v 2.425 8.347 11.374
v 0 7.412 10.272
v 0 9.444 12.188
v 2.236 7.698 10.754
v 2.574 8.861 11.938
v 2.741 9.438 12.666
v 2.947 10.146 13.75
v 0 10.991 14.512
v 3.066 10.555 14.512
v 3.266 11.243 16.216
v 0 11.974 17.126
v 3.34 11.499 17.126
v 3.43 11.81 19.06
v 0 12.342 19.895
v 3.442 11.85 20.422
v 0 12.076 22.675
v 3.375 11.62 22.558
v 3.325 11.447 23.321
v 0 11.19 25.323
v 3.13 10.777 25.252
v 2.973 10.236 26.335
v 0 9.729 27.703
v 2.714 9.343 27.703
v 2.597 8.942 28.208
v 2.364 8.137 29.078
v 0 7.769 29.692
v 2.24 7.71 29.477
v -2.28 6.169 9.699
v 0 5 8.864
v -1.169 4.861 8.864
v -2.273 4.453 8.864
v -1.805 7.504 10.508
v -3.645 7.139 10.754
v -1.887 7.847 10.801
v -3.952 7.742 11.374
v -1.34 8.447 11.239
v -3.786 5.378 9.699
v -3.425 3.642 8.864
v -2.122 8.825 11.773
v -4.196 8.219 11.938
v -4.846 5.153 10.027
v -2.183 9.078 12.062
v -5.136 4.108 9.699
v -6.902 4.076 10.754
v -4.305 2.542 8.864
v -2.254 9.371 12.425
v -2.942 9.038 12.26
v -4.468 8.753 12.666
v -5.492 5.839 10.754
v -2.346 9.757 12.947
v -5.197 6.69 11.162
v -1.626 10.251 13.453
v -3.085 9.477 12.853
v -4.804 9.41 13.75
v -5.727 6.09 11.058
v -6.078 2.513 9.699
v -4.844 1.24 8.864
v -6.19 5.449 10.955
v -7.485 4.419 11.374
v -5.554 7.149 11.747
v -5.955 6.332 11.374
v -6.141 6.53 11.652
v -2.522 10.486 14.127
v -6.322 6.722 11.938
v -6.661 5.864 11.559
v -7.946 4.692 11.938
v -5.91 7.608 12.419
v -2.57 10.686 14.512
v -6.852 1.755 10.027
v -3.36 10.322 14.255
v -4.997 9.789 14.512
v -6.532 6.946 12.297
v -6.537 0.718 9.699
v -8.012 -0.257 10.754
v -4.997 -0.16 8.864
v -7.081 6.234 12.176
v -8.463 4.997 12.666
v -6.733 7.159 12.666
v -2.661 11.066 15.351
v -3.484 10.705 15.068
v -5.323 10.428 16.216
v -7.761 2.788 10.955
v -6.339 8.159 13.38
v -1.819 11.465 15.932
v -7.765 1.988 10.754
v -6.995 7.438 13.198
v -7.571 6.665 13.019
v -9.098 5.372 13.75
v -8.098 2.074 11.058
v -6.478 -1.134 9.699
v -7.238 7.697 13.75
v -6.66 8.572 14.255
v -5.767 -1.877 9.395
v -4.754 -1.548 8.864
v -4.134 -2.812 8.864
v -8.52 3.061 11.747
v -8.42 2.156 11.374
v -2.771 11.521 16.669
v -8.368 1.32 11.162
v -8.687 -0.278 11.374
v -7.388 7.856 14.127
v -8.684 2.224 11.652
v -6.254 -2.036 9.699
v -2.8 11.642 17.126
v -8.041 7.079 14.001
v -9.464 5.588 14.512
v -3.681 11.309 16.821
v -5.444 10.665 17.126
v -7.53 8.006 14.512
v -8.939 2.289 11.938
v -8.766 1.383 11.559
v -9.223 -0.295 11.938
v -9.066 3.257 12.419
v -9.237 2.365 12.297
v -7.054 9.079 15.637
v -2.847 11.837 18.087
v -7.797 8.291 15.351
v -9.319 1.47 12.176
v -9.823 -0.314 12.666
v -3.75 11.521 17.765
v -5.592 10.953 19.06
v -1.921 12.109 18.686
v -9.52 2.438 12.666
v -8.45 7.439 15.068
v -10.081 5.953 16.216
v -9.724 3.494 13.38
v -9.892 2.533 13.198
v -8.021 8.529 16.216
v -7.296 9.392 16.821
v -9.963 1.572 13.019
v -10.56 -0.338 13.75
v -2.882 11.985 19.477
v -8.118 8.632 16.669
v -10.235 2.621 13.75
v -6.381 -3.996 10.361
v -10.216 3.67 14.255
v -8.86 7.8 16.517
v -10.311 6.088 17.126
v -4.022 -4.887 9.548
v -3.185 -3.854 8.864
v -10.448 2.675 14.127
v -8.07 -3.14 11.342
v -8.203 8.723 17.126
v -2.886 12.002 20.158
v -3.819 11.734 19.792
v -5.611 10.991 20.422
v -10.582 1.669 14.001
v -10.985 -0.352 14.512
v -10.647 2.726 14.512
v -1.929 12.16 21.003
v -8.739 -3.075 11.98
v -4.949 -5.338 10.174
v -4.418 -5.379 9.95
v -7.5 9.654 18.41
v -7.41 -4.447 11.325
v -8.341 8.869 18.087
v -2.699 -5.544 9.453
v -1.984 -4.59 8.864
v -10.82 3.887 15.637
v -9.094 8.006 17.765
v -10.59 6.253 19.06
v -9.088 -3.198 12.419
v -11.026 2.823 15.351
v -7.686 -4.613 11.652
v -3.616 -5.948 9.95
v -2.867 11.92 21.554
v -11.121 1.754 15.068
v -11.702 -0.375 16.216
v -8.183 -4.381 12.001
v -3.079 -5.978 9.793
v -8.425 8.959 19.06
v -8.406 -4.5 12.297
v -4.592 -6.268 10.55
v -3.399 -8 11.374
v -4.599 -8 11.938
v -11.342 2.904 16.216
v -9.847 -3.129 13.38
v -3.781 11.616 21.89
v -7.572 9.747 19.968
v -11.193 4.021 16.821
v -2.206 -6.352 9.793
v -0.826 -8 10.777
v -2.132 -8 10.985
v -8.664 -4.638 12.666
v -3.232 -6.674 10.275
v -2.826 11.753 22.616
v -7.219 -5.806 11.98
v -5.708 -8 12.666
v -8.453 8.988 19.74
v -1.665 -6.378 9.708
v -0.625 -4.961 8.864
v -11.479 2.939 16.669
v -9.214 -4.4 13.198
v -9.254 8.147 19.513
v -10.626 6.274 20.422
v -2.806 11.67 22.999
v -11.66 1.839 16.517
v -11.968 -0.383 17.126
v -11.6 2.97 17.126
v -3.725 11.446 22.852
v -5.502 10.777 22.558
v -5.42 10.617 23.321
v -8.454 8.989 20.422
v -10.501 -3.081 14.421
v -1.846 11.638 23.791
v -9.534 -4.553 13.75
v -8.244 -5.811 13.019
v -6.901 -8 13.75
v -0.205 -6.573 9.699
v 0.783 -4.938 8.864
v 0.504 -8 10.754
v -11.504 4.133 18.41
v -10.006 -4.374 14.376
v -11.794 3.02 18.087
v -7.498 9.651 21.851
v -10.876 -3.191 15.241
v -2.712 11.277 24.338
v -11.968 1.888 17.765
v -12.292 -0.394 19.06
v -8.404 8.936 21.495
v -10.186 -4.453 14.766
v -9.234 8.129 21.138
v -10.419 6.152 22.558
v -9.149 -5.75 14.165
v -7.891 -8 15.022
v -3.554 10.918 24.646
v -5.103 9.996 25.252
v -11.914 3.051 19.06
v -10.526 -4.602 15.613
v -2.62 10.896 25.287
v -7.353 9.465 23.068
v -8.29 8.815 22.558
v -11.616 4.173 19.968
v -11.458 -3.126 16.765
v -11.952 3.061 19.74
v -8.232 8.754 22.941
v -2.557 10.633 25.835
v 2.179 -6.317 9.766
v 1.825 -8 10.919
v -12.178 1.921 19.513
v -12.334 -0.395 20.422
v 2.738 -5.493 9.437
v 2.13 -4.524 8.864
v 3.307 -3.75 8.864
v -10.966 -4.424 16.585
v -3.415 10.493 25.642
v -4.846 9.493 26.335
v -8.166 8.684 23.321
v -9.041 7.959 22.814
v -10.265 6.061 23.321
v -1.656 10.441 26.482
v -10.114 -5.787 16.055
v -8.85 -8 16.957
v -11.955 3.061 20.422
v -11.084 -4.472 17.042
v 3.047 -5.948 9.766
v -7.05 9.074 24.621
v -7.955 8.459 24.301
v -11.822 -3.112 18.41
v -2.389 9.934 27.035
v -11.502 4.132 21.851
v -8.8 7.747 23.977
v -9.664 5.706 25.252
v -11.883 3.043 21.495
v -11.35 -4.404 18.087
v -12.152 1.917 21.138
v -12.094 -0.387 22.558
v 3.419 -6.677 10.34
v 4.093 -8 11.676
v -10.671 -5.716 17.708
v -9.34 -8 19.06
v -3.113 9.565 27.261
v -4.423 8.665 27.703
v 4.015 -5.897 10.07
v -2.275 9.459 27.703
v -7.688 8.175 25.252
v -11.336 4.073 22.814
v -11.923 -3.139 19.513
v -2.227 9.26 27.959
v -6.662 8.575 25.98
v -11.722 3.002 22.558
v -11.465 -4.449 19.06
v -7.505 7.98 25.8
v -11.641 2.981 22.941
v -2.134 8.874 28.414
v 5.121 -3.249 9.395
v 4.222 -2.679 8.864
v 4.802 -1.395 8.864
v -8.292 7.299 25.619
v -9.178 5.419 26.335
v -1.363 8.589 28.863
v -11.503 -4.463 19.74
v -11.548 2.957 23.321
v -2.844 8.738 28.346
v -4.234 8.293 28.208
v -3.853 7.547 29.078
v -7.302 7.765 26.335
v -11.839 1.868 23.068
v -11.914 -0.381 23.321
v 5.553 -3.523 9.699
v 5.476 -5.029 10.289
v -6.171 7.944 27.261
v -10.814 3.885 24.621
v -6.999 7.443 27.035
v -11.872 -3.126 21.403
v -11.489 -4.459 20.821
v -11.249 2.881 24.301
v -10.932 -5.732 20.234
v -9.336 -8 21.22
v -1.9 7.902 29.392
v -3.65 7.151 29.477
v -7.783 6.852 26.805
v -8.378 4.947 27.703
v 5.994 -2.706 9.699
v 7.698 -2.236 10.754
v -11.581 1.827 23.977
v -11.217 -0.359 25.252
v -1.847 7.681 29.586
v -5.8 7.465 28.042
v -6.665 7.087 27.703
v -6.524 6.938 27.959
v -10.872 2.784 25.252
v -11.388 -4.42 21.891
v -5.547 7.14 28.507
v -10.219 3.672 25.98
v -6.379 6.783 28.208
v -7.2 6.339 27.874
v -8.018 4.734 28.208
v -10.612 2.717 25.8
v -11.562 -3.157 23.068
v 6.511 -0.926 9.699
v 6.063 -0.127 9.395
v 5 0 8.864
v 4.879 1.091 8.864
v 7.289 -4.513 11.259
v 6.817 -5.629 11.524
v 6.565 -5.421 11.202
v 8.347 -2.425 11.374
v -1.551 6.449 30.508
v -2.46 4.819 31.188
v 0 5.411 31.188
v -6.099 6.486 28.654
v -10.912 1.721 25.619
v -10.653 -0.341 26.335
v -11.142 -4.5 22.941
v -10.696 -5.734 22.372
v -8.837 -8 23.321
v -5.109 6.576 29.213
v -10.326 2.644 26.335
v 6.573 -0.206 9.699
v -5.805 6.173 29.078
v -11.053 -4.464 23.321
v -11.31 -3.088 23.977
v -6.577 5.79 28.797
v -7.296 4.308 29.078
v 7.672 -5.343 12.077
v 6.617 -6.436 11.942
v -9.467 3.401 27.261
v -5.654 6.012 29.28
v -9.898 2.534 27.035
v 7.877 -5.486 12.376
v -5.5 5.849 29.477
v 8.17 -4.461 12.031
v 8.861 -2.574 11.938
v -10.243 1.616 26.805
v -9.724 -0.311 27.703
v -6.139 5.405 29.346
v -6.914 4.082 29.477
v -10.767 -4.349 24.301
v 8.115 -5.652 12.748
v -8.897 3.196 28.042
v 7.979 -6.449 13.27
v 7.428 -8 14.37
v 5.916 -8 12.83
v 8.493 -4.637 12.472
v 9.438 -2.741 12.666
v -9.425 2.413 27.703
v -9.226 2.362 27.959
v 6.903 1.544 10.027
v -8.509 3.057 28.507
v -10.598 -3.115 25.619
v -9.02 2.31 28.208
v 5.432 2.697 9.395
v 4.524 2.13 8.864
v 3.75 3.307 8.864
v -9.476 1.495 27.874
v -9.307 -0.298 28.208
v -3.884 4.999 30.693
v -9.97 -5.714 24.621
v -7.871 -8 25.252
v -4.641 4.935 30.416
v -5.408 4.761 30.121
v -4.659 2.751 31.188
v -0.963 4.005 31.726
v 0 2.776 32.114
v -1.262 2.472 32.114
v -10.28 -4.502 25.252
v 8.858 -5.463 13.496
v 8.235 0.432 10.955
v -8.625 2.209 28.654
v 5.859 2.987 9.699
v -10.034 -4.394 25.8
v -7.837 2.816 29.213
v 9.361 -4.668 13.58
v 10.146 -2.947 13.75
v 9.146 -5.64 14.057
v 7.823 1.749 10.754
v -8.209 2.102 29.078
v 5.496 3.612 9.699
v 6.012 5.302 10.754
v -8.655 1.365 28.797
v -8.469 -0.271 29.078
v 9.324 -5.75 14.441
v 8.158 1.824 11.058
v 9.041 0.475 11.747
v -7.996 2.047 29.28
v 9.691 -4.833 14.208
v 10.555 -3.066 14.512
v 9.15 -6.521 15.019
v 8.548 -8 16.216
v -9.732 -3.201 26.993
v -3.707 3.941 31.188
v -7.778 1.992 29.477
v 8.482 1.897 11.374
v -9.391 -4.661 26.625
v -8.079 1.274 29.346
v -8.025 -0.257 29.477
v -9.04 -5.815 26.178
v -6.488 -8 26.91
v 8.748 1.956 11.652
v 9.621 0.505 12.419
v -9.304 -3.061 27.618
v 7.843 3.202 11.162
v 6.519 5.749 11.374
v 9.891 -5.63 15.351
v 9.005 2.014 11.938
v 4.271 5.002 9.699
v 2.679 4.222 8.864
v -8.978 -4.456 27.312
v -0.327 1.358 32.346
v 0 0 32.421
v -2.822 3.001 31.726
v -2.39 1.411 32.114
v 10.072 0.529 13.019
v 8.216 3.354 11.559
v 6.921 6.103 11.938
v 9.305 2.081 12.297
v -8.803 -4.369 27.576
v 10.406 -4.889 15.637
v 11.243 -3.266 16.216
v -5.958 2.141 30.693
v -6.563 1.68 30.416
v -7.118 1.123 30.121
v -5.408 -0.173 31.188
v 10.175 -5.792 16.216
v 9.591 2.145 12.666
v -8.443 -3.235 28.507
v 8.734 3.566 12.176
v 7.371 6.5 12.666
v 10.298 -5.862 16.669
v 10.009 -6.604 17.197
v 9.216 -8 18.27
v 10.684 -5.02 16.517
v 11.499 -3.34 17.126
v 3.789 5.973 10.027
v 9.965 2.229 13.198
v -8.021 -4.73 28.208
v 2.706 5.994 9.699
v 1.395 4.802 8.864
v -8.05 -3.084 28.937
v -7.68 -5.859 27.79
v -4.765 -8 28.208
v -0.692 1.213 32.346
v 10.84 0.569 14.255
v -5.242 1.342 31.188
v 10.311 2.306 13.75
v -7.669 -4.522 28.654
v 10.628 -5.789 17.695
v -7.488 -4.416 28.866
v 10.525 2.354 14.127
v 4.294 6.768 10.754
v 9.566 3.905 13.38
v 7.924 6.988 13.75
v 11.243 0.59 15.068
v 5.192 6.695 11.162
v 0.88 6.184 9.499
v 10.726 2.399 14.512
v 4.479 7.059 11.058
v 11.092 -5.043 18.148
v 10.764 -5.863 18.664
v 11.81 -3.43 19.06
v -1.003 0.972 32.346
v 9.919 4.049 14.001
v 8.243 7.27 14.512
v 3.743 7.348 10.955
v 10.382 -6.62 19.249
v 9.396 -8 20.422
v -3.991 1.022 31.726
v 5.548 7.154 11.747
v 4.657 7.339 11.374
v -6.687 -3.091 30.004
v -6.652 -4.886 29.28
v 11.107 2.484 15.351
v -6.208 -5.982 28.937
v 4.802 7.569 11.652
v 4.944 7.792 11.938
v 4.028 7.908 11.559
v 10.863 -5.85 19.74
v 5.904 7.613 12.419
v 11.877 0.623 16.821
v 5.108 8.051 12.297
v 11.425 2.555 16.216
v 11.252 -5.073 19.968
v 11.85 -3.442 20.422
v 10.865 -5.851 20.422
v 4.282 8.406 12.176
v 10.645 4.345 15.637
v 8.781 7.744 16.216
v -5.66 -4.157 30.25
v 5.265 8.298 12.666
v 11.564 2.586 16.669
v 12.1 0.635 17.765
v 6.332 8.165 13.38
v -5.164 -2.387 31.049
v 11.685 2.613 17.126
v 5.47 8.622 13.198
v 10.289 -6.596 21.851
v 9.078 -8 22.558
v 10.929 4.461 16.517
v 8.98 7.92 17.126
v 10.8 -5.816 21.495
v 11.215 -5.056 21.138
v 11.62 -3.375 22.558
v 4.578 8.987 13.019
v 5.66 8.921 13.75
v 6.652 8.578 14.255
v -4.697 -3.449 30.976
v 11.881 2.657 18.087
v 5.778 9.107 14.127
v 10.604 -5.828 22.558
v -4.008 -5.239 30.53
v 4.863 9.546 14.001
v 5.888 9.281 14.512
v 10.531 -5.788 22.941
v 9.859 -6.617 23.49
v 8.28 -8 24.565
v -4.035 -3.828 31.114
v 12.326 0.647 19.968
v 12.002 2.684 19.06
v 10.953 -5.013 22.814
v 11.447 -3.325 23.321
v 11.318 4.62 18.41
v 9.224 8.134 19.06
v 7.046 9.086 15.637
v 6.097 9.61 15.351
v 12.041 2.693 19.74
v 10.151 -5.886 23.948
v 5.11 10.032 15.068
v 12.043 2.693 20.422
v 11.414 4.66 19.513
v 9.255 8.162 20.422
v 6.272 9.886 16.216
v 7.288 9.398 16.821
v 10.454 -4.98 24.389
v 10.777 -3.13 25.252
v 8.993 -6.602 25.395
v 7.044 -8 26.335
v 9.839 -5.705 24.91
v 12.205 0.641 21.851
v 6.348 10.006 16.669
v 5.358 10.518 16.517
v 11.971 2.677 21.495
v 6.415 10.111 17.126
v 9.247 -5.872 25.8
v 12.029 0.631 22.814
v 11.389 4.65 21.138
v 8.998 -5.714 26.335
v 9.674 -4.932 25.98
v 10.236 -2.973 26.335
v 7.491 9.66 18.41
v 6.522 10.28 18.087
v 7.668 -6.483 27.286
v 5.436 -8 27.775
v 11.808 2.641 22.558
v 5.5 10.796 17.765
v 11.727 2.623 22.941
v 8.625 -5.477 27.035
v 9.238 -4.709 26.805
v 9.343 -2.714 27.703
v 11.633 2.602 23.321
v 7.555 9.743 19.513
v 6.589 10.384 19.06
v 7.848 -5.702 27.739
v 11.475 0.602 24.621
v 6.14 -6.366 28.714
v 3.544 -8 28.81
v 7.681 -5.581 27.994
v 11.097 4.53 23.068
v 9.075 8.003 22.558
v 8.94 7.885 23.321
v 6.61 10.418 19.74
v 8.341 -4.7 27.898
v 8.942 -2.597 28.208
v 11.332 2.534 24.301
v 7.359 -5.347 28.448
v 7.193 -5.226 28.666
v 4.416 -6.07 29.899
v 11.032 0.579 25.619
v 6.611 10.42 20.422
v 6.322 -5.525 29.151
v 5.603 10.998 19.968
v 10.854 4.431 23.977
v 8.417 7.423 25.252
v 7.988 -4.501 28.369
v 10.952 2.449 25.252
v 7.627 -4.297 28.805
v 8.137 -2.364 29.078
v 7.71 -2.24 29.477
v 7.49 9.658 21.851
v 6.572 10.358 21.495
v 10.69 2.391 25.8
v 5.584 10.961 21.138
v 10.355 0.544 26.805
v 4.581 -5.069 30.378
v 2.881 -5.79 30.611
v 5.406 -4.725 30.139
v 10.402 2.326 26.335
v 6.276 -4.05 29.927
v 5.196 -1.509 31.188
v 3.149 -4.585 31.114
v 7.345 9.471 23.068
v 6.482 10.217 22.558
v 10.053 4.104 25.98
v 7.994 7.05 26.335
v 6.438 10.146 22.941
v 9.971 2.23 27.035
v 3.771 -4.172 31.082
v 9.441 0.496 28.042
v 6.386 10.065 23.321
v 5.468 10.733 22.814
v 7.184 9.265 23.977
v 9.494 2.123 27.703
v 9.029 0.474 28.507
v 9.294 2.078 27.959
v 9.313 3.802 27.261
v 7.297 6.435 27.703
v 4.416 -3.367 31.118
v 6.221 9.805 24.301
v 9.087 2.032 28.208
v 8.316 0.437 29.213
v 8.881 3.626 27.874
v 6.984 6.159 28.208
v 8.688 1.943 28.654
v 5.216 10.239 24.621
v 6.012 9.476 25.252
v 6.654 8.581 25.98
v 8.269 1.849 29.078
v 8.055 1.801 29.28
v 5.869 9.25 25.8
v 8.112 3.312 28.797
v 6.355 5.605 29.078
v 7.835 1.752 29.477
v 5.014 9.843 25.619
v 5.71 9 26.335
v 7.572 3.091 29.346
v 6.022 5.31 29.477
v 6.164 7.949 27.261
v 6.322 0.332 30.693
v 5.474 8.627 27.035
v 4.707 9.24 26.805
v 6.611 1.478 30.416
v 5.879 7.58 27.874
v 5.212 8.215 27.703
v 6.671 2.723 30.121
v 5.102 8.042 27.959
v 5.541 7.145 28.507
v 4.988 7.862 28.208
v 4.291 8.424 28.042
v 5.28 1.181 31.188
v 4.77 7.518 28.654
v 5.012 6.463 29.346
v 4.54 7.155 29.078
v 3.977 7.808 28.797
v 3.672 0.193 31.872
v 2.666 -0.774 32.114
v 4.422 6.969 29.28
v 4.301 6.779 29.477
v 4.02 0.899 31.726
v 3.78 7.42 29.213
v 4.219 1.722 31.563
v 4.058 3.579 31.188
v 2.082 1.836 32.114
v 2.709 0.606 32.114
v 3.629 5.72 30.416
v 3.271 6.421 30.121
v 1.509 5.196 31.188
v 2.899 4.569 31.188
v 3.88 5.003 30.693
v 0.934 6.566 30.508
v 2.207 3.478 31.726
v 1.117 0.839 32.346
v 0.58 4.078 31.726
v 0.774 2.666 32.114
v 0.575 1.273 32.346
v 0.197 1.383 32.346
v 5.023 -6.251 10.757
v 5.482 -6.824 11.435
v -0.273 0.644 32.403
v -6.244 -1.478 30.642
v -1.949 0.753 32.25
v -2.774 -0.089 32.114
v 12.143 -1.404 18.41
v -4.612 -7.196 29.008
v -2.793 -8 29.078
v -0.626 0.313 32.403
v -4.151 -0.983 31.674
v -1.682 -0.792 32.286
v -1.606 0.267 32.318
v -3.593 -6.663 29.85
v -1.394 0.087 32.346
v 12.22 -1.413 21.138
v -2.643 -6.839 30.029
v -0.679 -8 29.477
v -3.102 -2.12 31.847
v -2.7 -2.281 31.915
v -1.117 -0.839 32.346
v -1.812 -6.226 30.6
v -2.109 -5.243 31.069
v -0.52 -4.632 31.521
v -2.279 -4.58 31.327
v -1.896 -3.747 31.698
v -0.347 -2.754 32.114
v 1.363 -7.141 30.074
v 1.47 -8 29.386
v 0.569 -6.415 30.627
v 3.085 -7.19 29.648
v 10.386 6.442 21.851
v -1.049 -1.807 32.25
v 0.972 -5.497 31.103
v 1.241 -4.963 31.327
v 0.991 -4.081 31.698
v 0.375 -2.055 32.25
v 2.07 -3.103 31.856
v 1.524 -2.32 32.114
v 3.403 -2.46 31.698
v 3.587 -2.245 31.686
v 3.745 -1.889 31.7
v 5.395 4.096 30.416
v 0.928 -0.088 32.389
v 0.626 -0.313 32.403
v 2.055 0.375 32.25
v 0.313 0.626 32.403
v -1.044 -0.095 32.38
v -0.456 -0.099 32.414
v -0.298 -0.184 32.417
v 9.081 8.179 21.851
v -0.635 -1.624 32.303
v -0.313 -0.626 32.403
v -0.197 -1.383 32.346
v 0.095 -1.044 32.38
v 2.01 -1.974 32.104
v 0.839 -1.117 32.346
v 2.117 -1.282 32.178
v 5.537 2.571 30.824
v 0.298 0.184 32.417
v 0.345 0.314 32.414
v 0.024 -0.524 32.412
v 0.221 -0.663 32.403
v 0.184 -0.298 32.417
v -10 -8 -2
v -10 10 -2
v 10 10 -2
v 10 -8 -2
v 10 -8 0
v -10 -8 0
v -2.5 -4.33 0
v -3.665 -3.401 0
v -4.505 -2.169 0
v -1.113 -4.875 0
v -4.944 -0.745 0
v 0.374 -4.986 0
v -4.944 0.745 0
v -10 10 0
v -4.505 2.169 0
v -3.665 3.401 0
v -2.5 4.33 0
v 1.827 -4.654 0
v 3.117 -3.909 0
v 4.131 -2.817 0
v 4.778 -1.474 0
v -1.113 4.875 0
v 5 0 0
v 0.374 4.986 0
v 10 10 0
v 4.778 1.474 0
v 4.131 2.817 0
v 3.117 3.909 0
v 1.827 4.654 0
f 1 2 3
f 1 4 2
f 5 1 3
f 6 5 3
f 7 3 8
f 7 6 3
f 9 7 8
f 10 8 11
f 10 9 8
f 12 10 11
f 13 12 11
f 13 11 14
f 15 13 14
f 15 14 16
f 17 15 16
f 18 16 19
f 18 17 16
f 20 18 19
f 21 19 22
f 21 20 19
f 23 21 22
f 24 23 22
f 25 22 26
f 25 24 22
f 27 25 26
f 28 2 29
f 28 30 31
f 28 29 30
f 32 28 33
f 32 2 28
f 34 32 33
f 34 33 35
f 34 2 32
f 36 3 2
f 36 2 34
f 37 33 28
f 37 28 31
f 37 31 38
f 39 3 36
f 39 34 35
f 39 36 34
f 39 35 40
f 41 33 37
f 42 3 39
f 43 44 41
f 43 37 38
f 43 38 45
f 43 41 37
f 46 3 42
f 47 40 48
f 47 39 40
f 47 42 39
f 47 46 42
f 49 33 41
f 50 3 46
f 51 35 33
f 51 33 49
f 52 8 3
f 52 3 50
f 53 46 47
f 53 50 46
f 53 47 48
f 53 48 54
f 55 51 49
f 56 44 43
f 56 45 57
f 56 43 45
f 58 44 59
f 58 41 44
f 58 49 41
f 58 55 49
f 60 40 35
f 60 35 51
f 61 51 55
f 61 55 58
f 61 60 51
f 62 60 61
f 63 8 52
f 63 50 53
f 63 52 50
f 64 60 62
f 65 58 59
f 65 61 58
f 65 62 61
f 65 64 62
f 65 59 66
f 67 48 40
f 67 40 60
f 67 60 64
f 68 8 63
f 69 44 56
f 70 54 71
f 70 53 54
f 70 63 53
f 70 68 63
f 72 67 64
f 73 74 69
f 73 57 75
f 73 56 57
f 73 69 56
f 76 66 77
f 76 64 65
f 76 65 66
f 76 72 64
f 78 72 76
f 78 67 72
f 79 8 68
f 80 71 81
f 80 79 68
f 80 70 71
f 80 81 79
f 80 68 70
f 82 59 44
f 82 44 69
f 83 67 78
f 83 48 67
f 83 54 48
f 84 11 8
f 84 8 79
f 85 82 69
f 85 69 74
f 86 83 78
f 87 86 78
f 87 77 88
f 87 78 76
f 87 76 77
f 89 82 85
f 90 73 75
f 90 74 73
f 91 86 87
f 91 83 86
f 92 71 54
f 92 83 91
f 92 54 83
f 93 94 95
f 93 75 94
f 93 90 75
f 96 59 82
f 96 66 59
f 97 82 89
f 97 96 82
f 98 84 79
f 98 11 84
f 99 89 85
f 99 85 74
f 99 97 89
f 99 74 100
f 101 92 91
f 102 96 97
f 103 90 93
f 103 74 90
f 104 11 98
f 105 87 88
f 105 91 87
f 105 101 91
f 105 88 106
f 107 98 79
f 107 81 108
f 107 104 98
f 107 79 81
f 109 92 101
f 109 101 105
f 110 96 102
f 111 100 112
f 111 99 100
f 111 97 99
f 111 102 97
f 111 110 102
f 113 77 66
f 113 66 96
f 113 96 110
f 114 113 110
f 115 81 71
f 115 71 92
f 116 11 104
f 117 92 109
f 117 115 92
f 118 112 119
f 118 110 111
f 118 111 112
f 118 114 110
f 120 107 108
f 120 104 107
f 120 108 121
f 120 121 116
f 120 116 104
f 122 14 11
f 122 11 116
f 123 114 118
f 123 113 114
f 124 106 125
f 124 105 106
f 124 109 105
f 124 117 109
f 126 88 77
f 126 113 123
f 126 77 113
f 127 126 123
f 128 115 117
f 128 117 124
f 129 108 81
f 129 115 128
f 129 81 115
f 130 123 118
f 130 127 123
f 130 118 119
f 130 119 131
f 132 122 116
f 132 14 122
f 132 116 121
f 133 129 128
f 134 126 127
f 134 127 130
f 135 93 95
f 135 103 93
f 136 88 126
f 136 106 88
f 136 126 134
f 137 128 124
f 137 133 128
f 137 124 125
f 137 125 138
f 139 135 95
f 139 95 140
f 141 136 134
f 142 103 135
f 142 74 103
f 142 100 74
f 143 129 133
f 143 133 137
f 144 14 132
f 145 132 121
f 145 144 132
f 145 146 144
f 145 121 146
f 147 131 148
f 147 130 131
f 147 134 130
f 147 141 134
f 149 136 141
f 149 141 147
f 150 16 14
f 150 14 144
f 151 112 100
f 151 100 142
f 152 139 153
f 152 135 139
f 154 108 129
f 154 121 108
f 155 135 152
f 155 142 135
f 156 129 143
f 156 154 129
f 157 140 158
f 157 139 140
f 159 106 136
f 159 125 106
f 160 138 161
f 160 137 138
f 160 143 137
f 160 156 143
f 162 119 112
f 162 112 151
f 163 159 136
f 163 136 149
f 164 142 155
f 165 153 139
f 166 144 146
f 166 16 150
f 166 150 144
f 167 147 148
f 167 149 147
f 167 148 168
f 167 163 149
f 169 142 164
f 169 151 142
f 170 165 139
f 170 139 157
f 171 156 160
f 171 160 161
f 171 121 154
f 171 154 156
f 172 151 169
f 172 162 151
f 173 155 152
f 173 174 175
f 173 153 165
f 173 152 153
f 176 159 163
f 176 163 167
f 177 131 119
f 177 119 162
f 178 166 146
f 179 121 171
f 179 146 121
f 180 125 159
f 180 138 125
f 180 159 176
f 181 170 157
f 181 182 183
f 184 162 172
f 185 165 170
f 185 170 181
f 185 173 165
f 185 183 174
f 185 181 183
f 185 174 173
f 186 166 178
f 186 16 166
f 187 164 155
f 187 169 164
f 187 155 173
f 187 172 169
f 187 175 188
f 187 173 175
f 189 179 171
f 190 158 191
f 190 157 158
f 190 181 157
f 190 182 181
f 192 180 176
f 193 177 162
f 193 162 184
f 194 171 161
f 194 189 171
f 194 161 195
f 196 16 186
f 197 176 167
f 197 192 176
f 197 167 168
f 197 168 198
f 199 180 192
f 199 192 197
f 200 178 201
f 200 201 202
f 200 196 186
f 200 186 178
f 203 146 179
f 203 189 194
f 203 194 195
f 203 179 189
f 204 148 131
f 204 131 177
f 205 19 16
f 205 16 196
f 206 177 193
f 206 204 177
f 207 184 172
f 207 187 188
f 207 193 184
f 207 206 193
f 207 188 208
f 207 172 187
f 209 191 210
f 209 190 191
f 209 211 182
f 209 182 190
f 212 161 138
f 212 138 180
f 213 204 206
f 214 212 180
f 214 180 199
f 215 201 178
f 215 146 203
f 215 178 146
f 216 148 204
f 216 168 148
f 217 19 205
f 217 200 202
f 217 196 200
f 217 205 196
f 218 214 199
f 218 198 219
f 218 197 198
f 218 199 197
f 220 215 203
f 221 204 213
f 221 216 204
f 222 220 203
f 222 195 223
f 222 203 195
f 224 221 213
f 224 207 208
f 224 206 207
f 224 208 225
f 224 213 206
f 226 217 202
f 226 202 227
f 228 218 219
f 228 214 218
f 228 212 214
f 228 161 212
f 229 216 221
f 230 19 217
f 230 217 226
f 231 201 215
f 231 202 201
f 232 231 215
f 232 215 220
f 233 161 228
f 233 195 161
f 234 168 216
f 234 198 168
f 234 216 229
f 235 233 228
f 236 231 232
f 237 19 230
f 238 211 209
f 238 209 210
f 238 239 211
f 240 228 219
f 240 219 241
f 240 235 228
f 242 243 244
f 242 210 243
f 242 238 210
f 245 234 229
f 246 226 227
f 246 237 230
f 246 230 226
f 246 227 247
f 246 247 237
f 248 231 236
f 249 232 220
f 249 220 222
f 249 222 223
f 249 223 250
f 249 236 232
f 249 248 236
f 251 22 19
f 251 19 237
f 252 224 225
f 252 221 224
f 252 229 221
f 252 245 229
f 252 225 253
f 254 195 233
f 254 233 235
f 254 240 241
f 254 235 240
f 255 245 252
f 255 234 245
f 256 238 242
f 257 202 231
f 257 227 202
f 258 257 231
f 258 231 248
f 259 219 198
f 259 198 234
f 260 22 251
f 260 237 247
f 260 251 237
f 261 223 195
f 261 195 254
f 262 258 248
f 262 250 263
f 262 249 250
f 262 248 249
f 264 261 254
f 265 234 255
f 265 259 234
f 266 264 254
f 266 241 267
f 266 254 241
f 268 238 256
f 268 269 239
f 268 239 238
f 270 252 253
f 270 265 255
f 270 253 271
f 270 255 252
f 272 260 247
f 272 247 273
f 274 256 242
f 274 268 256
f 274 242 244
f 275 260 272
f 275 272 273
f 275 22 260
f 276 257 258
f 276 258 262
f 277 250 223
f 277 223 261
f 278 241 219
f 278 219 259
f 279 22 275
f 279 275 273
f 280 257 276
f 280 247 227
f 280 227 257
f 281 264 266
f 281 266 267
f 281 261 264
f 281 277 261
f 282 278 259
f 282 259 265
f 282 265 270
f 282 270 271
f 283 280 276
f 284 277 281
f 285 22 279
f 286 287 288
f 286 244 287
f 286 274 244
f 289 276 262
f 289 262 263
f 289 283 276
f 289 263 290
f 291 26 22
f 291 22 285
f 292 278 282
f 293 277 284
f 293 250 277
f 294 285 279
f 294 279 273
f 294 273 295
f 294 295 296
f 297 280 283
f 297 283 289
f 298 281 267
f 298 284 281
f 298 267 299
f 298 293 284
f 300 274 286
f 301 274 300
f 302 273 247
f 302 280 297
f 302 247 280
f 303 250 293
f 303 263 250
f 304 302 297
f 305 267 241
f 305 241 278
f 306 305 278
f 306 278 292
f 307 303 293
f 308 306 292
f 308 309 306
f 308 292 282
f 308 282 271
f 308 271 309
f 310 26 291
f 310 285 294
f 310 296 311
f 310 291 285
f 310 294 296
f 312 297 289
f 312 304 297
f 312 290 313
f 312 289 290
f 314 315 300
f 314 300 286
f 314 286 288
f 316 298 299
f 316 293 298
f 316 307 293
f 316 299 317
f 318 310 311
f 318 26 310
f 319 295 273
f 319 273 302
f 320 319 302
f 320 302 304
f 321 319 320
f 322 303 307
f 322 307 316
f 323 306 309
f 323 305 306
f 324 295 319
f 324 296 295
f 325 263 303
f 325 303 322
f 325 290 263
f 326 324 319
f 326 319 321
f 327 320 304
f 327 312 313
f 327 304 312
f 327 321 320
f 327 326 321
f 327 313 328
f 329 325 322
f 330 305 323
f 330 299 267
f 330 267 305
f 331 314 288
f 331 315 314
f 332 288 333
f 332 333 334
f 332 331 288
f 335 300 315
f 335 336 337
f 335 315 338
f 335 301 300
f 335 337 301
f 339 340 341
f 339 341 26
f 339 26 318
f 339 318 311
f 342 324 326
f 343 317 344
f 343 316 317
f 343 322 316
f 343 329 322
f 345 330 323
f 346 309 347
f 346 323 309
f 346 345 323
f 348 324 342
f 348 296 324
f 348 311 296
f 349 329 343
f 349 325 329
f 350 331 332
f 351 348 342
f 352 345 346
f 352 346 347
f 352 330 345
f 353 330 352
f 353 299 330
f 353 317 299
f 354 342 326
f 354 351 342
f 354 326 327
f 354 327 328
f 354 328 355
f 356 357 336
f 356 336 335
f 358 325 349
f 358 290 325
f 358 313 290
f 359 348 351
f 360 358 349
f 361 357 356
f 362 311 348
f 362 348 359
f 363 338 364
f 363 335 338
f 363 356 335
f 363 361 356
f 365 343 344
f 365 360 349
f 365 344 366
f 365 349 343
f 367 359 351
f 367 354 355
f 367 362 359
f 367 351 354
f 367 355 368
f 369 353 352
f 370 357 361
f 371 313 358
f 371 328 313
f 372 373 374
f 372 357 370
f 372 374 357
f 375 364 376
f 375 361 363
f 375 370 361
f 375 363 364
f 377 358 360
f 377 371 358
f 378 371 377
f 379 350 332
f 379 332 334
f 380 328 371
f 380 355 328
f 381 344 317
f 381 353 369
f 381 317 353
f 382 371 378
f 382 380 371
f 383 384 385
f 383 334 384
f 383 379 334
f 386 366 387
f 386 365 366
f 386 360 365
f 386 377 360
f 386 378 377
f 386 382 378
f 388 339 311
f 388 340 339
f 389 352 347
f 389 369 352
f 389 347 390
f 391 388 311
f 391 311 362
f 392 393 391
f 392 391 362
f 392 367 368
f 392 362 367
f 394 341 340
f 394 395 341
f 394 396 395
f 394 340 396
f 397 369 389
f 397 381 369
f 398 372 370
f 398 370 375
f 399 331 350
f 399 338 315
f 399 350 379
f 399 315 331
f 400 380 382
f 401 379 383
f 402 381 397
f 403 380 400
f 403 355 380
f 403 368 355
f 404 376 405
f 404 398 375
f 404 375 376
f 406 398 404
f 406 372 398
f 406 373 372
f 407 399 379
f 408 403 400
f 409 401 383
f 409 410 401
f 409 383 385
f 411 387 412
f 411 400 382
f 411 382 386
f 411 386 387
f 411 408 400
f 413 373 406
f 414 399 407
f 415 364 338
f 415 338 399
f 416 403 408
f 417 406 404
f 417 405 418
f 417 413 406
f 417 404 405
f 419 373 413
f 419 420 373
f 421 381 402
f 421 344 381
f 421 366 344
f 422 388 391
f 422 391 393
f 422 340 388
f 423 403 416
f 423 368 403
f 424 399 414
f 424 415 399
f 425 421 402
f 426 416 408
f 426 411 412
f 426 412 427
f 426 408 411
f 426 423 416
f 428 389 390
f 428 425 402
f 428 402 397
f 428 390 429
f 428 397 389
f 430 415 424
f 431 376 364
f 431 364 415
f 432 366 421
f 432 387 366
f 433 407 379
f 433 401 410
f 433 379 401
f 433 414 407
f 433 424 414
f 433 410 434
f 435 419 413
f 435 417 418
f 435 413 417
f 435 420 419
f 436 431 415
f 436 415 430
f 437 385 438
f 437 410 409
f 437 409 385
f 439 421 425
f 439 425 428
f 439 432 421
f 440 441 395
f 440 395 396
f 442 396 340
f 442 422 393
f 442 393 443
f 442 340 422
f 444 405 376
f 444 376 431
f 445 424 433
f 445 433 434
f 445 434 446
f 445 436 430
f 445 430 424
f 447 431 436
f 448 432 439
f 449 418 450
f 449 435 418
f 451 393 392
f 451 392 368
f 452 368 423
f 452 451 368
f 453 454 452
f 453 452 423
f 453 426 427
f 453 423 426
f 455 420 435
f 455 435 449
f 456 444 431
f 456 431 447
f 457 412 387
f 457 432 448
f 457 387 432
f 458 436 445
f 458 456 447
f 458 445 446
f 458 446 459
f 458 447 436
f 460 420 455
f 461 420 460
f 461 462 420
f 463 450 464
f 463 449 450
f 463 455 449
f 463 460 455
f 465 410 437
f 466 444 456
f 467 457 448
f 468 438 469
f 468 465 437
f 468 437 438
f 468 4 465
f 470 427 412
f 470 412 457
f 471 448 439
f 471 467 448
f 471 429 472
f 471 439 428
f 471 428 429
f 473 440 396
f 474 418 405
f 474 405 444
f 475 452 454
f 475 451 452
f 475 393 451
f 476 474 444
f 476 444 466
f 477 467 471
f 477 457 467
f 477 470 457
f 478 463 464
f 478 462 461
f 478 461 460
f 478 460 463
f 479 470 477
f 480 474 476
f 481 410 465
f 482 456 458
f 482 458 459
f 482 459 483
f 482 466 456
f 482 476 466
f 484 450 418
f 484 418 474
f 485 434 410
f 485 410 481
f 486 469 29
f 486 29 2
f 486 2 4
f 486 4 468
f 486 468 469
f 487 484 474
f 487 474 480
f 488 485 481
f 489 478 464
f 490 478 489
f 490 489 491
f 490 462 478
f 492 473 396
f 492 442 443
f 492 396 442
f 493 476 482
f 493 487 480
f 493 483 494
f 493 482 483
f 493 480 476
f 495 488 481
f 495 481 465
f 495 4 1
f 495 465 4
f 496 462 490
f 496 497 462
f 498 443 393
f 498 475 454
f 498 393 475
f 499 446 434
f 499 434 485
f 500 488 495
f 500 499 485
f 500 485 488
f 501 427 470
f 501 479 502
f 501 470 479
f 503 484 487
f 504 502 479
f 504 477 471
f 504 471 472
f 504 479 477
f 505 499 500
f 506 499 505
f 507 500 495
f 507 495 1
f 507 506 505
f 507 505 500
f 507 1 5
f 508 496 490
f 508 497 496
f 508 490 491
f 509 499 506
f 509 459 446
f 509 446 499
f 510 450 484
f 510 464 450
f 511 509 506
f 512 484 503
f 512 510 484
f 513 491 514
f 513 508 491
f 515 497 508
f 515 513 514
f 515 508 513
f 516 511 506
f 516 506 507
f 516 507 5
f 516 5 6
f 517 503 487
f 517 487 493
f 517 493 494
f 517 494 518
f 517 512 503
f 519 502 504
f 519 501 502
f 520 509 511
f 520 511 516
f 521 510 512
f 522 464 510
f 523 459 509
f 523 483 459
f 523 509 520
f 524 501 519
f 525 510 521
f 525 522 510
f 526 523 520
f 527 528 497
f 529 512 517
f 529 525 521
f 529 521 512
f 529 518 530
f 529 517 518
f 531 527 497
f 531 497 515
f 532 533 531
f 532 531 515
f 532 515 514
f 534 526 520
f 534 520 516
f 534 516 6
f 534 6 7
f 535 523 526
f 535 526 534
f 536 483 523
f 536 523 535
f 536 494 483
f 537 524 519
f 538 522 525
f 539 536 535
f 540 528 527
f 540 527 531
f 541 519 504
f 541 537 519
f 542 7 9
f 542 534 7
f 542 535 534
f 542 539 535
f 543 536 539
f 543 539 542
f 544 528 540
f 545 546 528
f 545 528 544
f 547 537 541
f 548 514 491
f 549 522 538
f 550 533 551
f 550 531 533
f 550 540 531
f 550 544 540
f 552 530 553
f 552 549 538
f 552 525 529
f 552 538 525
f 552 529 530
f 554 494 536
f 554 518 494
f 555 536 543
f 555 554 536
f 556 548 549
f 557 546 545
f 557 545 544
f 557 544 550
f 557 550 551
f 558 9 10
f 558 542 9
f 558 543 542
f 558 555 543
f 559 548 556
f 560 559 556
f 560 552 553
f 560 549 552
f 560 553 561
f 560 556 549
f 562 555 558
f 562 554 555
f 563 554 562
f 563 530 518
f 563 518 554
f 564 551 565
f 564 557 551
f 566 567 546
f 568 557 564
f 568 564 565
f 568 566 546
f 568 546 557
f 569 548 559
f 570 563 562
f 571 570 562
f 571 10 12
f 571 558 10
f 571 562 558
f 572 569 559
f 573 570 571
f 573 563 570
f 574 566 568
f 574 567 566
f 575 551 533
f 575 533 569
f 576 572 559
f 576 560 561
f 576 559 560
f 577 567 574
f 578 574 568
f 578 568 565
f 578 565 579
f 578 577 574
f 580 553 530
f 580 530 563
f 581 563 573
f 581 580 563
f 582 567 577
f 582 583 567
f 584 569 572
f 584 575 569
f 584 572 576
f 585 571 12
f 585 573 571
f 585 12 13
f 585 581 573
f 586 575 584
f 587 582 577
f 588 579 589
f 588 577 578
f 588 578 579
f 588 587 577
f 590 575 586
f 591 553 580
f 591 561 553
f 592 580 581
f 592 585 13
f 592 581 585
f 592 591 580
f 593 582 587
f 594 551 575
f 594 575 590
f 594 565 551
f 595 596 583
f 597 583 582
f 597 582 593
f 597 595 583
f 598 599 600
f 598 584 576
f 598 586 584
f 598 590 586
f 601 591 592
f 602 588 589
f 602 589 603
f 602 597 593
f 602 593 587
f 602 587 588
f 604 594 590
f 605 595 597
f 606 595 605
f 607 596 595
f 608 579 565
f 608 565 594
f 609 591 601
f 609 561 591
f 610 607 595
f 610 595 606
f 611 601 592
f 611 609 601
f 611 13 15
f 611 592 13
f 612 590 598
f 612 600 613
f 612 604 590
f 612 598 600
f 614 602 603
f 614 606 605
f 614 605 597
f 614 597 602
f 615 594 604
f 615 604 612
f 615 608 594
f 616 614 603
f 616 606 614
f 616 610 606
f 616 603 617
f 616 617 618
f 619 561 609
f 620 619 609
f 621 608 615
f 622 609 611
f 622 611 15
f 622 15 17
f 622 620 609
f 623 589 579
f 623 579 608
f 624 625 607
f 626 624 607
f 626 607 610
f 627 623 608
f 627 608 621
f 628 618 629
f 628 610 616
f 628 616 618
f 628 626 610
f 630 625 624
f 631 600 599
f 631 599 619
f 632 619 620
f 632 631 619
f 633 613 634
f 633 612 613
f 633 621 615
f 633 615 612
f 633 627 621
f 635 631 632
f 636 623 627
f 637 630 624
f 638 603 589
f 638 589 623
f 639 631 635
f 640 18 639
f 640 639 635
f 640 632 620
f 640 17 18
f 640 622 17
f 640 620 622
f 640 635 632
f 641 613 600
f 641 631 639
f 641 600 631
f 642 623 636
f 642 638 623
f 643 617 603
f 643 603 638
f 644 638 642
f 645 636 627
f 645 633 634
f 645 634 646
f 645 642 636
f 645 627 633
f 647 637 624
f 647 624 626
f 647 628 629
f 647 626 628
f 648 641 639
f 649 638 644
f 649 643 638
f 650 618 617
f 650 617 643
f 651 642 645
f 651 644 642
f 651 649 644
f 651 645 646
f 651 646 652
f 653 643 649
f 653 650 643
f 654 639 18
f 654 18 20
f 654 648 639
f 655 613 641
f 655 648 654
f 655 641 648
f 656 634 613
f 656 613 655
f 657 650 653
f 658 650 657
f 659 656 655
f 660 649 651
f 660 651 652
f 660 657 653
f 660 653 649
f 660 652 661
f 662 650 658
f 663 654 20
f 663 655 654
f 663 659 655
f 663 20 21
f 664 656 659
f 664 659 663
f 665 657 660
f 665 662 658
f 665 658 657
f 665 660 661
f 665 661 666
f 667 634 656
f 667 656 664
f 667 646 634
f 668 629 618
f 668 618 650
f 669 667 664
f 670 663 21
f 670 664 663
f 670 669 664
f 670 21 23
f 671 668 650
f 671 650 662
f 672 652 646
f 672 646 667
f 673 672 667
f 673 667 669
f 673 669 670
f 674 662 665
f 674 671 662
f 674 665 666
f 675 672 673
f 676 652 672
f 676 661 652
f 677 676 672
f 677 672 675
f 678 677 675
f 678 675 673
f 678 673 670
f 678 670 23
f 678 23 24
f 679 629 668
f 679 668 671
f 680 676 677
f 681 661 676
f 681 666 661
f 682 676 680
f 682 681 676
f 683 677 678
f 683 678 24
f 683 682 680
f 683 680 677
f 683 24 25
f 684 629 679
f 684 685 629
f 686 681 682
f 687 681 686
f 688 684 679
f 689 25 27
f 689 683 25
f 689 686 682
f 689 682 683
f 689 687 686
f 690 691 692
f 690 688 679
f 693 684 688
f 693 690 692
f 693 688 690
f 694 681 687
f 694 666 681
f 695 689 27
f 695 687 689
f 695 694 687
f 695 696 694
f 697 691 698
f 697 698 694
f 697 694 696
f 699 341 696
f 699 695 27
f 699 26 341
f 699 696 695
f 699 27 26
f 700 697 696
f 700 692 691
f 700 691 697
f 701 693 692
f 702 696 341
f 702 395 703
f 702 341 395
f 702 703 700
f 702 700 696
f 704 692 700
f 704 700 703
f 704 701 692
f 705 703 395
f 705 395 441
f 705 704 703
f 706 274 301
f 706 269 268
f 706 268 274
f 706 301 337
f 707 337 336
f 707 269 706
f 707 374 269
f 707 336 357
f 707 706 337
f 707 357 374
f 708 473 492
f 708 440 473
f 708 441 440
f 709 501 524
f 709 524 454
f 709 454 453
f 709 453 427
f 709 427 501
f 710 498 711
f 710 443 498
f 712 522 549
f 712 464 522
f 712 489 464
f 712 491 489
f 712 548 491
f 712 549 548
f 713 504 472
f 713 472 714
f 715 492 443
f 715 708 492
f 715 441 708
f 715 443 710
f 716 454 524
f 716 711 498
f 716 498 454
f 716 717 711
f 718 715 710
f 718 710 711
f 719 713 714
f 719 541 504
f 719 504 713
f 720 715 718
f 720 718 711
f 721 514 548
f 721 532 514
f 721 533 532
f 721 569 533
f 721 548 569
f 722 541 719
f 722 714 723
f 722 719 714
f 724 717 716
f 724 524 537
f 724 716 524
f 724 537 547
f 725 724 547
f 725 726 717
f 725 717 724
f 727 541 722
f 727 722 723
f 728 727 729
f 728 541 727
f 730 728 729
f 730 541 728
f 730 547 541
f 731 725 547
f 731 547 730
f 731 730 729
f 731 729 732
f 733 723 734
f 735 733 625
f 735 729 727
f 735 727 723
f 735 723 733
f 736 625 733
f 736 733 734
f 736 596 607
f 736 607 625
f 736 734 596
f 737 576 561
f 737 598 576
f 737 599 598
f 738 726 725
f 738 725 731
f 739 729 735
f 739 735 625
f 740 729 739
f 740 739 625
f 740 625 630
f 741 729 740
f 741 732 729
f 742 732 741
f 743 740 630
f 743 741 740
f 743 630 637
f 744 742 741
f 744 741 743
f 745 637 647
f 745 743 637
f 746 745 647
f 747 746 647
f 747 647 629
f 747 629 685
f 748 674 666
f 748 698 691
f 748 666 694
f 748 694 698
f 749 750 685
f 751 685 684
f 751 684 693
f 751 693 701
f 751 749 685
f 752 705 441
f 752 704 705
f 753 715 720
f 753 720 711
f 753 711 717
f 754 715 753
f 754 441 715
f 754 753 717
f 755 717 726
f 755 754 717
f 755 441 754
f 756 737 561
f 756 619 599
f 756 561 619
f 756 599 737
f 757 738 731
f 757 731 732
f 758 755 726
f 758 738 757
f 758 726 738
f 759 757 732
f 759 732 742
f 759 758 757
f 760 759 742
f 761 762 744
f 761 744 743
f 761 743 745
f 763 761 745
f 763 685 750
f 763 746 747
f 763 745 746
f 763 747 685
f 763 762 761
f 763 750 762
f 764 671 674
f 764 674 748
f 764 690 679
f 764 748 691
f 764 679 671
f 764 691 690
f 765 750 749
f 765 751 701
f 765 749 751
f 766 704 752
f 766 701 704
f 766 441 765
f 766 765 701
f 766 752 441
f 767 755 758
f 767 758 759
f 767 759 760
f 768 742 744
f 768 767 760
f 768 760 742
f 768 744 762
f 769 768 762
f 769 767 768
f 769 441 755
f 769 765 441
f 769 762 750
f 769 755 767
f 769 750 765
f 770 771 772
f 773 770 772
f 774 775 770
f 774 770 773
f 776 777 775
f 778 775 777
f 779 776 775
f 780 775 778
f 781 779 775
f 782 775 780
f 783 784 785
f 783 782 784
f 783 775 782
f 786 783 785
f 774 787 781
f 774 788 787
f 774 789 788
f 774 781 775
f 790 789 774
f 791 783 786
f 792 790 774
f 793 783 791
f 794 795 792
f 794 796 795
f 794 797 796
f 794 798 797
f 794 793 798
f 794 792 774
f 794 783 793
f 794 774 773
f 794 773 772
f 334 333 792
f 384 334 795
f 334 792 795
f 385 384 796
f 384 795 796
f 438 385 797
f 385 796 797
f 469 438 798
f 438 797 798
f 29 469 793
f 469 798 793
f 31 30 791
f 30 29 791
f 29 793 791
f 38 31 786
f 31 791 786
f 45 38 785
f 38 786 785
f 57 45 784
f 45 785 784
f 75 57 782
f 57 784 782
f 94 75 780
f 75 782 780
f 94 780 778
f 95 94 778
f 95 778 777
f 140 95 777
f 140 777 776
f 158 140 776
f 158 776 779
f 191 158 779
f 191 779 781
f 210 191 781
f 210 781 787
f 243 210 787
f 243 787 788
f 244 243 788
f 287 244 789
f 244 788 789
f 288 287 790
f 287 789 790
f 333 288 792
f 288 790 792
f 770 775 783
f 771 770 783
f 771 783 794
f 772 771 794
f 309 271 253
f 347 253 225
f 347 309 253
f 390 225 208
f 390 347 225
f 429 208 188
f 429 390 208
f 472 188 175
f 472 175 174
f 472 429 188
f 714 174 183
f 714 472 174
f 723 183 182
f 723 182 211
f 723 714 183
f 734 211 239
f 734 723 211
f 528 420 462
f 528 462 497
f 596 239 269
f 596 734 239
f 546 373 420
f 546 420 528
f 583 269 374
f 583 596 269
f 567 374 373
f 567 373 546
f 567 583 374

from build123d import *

# Parameters (mm, degrees)
F0_W     = 20
F0_H     = 20
F0_R     = 5
F1_DEPTH = 2
F2_DEPTH = 10
F5_W     = 20
F5_H     = 48
F6_DEPTH = 2
F5_H_2   = 50
F7_DEPTH = 5
F8_DEPTH = 2


with BuildPart() as f1:
    # F0 (on Top) → F1 (new body)
    with BuildSketch(Plane.XY):
        Rectangle(F0_W, F0_H)
        Circle(F0_R, mode=Mode.SUBTRACT)
        Circle(F0_R)
    extrude(amount=-F1_DEPTH)

    # F0 (on Top) → F2 (join)
    with BuildSketch(Plane.XY):
        Circle(F0_R)
    extrude(amount=F2_DEPTH)

    # F3 (on Right) → F4 (revolve)
    with BuildSketch(Plane.YZ):
        with BuildLine():
            Line((0, 32.42085), (0, 7.821007))
            ThreePointArc((0, 7.821007), (12.343947, 20.120929), (0, 32.42085))
        make_face()
    revolve(axis=Axis((0, 0, 16.210425), (0, 0, 1)))

    # F5 (on face) → F6 (cut)
    with BuildSketch(Plane.XZ.offset(10)):
        with Locations((0, 24)):
            Rectangle(F5_W, F5_H)
    extrude(amount=-F6_DEPTH, mode=Mode.SUBTRACT)

    # F5 (on face) → F7 (cut)
    with BuildSketch(Plane.XZ.offset(10)):
        with Locations((0, 23)):
            Rectangle(F5_W, F5_H_2)
    extrude(amount=F7_DEPTH, mode=Mode.SUBTRACT)

    # F5 (on face) → F8 (cut)
    with BuildSketch(Plane.XZ.offset(10)):
        with Locations((0, 23)):
            Rectangle(F5_W, F5_H_2)
    extrude(amount=-F8_DEPTH, mode=Mode.SUBTRACT)


solid = f1.part
